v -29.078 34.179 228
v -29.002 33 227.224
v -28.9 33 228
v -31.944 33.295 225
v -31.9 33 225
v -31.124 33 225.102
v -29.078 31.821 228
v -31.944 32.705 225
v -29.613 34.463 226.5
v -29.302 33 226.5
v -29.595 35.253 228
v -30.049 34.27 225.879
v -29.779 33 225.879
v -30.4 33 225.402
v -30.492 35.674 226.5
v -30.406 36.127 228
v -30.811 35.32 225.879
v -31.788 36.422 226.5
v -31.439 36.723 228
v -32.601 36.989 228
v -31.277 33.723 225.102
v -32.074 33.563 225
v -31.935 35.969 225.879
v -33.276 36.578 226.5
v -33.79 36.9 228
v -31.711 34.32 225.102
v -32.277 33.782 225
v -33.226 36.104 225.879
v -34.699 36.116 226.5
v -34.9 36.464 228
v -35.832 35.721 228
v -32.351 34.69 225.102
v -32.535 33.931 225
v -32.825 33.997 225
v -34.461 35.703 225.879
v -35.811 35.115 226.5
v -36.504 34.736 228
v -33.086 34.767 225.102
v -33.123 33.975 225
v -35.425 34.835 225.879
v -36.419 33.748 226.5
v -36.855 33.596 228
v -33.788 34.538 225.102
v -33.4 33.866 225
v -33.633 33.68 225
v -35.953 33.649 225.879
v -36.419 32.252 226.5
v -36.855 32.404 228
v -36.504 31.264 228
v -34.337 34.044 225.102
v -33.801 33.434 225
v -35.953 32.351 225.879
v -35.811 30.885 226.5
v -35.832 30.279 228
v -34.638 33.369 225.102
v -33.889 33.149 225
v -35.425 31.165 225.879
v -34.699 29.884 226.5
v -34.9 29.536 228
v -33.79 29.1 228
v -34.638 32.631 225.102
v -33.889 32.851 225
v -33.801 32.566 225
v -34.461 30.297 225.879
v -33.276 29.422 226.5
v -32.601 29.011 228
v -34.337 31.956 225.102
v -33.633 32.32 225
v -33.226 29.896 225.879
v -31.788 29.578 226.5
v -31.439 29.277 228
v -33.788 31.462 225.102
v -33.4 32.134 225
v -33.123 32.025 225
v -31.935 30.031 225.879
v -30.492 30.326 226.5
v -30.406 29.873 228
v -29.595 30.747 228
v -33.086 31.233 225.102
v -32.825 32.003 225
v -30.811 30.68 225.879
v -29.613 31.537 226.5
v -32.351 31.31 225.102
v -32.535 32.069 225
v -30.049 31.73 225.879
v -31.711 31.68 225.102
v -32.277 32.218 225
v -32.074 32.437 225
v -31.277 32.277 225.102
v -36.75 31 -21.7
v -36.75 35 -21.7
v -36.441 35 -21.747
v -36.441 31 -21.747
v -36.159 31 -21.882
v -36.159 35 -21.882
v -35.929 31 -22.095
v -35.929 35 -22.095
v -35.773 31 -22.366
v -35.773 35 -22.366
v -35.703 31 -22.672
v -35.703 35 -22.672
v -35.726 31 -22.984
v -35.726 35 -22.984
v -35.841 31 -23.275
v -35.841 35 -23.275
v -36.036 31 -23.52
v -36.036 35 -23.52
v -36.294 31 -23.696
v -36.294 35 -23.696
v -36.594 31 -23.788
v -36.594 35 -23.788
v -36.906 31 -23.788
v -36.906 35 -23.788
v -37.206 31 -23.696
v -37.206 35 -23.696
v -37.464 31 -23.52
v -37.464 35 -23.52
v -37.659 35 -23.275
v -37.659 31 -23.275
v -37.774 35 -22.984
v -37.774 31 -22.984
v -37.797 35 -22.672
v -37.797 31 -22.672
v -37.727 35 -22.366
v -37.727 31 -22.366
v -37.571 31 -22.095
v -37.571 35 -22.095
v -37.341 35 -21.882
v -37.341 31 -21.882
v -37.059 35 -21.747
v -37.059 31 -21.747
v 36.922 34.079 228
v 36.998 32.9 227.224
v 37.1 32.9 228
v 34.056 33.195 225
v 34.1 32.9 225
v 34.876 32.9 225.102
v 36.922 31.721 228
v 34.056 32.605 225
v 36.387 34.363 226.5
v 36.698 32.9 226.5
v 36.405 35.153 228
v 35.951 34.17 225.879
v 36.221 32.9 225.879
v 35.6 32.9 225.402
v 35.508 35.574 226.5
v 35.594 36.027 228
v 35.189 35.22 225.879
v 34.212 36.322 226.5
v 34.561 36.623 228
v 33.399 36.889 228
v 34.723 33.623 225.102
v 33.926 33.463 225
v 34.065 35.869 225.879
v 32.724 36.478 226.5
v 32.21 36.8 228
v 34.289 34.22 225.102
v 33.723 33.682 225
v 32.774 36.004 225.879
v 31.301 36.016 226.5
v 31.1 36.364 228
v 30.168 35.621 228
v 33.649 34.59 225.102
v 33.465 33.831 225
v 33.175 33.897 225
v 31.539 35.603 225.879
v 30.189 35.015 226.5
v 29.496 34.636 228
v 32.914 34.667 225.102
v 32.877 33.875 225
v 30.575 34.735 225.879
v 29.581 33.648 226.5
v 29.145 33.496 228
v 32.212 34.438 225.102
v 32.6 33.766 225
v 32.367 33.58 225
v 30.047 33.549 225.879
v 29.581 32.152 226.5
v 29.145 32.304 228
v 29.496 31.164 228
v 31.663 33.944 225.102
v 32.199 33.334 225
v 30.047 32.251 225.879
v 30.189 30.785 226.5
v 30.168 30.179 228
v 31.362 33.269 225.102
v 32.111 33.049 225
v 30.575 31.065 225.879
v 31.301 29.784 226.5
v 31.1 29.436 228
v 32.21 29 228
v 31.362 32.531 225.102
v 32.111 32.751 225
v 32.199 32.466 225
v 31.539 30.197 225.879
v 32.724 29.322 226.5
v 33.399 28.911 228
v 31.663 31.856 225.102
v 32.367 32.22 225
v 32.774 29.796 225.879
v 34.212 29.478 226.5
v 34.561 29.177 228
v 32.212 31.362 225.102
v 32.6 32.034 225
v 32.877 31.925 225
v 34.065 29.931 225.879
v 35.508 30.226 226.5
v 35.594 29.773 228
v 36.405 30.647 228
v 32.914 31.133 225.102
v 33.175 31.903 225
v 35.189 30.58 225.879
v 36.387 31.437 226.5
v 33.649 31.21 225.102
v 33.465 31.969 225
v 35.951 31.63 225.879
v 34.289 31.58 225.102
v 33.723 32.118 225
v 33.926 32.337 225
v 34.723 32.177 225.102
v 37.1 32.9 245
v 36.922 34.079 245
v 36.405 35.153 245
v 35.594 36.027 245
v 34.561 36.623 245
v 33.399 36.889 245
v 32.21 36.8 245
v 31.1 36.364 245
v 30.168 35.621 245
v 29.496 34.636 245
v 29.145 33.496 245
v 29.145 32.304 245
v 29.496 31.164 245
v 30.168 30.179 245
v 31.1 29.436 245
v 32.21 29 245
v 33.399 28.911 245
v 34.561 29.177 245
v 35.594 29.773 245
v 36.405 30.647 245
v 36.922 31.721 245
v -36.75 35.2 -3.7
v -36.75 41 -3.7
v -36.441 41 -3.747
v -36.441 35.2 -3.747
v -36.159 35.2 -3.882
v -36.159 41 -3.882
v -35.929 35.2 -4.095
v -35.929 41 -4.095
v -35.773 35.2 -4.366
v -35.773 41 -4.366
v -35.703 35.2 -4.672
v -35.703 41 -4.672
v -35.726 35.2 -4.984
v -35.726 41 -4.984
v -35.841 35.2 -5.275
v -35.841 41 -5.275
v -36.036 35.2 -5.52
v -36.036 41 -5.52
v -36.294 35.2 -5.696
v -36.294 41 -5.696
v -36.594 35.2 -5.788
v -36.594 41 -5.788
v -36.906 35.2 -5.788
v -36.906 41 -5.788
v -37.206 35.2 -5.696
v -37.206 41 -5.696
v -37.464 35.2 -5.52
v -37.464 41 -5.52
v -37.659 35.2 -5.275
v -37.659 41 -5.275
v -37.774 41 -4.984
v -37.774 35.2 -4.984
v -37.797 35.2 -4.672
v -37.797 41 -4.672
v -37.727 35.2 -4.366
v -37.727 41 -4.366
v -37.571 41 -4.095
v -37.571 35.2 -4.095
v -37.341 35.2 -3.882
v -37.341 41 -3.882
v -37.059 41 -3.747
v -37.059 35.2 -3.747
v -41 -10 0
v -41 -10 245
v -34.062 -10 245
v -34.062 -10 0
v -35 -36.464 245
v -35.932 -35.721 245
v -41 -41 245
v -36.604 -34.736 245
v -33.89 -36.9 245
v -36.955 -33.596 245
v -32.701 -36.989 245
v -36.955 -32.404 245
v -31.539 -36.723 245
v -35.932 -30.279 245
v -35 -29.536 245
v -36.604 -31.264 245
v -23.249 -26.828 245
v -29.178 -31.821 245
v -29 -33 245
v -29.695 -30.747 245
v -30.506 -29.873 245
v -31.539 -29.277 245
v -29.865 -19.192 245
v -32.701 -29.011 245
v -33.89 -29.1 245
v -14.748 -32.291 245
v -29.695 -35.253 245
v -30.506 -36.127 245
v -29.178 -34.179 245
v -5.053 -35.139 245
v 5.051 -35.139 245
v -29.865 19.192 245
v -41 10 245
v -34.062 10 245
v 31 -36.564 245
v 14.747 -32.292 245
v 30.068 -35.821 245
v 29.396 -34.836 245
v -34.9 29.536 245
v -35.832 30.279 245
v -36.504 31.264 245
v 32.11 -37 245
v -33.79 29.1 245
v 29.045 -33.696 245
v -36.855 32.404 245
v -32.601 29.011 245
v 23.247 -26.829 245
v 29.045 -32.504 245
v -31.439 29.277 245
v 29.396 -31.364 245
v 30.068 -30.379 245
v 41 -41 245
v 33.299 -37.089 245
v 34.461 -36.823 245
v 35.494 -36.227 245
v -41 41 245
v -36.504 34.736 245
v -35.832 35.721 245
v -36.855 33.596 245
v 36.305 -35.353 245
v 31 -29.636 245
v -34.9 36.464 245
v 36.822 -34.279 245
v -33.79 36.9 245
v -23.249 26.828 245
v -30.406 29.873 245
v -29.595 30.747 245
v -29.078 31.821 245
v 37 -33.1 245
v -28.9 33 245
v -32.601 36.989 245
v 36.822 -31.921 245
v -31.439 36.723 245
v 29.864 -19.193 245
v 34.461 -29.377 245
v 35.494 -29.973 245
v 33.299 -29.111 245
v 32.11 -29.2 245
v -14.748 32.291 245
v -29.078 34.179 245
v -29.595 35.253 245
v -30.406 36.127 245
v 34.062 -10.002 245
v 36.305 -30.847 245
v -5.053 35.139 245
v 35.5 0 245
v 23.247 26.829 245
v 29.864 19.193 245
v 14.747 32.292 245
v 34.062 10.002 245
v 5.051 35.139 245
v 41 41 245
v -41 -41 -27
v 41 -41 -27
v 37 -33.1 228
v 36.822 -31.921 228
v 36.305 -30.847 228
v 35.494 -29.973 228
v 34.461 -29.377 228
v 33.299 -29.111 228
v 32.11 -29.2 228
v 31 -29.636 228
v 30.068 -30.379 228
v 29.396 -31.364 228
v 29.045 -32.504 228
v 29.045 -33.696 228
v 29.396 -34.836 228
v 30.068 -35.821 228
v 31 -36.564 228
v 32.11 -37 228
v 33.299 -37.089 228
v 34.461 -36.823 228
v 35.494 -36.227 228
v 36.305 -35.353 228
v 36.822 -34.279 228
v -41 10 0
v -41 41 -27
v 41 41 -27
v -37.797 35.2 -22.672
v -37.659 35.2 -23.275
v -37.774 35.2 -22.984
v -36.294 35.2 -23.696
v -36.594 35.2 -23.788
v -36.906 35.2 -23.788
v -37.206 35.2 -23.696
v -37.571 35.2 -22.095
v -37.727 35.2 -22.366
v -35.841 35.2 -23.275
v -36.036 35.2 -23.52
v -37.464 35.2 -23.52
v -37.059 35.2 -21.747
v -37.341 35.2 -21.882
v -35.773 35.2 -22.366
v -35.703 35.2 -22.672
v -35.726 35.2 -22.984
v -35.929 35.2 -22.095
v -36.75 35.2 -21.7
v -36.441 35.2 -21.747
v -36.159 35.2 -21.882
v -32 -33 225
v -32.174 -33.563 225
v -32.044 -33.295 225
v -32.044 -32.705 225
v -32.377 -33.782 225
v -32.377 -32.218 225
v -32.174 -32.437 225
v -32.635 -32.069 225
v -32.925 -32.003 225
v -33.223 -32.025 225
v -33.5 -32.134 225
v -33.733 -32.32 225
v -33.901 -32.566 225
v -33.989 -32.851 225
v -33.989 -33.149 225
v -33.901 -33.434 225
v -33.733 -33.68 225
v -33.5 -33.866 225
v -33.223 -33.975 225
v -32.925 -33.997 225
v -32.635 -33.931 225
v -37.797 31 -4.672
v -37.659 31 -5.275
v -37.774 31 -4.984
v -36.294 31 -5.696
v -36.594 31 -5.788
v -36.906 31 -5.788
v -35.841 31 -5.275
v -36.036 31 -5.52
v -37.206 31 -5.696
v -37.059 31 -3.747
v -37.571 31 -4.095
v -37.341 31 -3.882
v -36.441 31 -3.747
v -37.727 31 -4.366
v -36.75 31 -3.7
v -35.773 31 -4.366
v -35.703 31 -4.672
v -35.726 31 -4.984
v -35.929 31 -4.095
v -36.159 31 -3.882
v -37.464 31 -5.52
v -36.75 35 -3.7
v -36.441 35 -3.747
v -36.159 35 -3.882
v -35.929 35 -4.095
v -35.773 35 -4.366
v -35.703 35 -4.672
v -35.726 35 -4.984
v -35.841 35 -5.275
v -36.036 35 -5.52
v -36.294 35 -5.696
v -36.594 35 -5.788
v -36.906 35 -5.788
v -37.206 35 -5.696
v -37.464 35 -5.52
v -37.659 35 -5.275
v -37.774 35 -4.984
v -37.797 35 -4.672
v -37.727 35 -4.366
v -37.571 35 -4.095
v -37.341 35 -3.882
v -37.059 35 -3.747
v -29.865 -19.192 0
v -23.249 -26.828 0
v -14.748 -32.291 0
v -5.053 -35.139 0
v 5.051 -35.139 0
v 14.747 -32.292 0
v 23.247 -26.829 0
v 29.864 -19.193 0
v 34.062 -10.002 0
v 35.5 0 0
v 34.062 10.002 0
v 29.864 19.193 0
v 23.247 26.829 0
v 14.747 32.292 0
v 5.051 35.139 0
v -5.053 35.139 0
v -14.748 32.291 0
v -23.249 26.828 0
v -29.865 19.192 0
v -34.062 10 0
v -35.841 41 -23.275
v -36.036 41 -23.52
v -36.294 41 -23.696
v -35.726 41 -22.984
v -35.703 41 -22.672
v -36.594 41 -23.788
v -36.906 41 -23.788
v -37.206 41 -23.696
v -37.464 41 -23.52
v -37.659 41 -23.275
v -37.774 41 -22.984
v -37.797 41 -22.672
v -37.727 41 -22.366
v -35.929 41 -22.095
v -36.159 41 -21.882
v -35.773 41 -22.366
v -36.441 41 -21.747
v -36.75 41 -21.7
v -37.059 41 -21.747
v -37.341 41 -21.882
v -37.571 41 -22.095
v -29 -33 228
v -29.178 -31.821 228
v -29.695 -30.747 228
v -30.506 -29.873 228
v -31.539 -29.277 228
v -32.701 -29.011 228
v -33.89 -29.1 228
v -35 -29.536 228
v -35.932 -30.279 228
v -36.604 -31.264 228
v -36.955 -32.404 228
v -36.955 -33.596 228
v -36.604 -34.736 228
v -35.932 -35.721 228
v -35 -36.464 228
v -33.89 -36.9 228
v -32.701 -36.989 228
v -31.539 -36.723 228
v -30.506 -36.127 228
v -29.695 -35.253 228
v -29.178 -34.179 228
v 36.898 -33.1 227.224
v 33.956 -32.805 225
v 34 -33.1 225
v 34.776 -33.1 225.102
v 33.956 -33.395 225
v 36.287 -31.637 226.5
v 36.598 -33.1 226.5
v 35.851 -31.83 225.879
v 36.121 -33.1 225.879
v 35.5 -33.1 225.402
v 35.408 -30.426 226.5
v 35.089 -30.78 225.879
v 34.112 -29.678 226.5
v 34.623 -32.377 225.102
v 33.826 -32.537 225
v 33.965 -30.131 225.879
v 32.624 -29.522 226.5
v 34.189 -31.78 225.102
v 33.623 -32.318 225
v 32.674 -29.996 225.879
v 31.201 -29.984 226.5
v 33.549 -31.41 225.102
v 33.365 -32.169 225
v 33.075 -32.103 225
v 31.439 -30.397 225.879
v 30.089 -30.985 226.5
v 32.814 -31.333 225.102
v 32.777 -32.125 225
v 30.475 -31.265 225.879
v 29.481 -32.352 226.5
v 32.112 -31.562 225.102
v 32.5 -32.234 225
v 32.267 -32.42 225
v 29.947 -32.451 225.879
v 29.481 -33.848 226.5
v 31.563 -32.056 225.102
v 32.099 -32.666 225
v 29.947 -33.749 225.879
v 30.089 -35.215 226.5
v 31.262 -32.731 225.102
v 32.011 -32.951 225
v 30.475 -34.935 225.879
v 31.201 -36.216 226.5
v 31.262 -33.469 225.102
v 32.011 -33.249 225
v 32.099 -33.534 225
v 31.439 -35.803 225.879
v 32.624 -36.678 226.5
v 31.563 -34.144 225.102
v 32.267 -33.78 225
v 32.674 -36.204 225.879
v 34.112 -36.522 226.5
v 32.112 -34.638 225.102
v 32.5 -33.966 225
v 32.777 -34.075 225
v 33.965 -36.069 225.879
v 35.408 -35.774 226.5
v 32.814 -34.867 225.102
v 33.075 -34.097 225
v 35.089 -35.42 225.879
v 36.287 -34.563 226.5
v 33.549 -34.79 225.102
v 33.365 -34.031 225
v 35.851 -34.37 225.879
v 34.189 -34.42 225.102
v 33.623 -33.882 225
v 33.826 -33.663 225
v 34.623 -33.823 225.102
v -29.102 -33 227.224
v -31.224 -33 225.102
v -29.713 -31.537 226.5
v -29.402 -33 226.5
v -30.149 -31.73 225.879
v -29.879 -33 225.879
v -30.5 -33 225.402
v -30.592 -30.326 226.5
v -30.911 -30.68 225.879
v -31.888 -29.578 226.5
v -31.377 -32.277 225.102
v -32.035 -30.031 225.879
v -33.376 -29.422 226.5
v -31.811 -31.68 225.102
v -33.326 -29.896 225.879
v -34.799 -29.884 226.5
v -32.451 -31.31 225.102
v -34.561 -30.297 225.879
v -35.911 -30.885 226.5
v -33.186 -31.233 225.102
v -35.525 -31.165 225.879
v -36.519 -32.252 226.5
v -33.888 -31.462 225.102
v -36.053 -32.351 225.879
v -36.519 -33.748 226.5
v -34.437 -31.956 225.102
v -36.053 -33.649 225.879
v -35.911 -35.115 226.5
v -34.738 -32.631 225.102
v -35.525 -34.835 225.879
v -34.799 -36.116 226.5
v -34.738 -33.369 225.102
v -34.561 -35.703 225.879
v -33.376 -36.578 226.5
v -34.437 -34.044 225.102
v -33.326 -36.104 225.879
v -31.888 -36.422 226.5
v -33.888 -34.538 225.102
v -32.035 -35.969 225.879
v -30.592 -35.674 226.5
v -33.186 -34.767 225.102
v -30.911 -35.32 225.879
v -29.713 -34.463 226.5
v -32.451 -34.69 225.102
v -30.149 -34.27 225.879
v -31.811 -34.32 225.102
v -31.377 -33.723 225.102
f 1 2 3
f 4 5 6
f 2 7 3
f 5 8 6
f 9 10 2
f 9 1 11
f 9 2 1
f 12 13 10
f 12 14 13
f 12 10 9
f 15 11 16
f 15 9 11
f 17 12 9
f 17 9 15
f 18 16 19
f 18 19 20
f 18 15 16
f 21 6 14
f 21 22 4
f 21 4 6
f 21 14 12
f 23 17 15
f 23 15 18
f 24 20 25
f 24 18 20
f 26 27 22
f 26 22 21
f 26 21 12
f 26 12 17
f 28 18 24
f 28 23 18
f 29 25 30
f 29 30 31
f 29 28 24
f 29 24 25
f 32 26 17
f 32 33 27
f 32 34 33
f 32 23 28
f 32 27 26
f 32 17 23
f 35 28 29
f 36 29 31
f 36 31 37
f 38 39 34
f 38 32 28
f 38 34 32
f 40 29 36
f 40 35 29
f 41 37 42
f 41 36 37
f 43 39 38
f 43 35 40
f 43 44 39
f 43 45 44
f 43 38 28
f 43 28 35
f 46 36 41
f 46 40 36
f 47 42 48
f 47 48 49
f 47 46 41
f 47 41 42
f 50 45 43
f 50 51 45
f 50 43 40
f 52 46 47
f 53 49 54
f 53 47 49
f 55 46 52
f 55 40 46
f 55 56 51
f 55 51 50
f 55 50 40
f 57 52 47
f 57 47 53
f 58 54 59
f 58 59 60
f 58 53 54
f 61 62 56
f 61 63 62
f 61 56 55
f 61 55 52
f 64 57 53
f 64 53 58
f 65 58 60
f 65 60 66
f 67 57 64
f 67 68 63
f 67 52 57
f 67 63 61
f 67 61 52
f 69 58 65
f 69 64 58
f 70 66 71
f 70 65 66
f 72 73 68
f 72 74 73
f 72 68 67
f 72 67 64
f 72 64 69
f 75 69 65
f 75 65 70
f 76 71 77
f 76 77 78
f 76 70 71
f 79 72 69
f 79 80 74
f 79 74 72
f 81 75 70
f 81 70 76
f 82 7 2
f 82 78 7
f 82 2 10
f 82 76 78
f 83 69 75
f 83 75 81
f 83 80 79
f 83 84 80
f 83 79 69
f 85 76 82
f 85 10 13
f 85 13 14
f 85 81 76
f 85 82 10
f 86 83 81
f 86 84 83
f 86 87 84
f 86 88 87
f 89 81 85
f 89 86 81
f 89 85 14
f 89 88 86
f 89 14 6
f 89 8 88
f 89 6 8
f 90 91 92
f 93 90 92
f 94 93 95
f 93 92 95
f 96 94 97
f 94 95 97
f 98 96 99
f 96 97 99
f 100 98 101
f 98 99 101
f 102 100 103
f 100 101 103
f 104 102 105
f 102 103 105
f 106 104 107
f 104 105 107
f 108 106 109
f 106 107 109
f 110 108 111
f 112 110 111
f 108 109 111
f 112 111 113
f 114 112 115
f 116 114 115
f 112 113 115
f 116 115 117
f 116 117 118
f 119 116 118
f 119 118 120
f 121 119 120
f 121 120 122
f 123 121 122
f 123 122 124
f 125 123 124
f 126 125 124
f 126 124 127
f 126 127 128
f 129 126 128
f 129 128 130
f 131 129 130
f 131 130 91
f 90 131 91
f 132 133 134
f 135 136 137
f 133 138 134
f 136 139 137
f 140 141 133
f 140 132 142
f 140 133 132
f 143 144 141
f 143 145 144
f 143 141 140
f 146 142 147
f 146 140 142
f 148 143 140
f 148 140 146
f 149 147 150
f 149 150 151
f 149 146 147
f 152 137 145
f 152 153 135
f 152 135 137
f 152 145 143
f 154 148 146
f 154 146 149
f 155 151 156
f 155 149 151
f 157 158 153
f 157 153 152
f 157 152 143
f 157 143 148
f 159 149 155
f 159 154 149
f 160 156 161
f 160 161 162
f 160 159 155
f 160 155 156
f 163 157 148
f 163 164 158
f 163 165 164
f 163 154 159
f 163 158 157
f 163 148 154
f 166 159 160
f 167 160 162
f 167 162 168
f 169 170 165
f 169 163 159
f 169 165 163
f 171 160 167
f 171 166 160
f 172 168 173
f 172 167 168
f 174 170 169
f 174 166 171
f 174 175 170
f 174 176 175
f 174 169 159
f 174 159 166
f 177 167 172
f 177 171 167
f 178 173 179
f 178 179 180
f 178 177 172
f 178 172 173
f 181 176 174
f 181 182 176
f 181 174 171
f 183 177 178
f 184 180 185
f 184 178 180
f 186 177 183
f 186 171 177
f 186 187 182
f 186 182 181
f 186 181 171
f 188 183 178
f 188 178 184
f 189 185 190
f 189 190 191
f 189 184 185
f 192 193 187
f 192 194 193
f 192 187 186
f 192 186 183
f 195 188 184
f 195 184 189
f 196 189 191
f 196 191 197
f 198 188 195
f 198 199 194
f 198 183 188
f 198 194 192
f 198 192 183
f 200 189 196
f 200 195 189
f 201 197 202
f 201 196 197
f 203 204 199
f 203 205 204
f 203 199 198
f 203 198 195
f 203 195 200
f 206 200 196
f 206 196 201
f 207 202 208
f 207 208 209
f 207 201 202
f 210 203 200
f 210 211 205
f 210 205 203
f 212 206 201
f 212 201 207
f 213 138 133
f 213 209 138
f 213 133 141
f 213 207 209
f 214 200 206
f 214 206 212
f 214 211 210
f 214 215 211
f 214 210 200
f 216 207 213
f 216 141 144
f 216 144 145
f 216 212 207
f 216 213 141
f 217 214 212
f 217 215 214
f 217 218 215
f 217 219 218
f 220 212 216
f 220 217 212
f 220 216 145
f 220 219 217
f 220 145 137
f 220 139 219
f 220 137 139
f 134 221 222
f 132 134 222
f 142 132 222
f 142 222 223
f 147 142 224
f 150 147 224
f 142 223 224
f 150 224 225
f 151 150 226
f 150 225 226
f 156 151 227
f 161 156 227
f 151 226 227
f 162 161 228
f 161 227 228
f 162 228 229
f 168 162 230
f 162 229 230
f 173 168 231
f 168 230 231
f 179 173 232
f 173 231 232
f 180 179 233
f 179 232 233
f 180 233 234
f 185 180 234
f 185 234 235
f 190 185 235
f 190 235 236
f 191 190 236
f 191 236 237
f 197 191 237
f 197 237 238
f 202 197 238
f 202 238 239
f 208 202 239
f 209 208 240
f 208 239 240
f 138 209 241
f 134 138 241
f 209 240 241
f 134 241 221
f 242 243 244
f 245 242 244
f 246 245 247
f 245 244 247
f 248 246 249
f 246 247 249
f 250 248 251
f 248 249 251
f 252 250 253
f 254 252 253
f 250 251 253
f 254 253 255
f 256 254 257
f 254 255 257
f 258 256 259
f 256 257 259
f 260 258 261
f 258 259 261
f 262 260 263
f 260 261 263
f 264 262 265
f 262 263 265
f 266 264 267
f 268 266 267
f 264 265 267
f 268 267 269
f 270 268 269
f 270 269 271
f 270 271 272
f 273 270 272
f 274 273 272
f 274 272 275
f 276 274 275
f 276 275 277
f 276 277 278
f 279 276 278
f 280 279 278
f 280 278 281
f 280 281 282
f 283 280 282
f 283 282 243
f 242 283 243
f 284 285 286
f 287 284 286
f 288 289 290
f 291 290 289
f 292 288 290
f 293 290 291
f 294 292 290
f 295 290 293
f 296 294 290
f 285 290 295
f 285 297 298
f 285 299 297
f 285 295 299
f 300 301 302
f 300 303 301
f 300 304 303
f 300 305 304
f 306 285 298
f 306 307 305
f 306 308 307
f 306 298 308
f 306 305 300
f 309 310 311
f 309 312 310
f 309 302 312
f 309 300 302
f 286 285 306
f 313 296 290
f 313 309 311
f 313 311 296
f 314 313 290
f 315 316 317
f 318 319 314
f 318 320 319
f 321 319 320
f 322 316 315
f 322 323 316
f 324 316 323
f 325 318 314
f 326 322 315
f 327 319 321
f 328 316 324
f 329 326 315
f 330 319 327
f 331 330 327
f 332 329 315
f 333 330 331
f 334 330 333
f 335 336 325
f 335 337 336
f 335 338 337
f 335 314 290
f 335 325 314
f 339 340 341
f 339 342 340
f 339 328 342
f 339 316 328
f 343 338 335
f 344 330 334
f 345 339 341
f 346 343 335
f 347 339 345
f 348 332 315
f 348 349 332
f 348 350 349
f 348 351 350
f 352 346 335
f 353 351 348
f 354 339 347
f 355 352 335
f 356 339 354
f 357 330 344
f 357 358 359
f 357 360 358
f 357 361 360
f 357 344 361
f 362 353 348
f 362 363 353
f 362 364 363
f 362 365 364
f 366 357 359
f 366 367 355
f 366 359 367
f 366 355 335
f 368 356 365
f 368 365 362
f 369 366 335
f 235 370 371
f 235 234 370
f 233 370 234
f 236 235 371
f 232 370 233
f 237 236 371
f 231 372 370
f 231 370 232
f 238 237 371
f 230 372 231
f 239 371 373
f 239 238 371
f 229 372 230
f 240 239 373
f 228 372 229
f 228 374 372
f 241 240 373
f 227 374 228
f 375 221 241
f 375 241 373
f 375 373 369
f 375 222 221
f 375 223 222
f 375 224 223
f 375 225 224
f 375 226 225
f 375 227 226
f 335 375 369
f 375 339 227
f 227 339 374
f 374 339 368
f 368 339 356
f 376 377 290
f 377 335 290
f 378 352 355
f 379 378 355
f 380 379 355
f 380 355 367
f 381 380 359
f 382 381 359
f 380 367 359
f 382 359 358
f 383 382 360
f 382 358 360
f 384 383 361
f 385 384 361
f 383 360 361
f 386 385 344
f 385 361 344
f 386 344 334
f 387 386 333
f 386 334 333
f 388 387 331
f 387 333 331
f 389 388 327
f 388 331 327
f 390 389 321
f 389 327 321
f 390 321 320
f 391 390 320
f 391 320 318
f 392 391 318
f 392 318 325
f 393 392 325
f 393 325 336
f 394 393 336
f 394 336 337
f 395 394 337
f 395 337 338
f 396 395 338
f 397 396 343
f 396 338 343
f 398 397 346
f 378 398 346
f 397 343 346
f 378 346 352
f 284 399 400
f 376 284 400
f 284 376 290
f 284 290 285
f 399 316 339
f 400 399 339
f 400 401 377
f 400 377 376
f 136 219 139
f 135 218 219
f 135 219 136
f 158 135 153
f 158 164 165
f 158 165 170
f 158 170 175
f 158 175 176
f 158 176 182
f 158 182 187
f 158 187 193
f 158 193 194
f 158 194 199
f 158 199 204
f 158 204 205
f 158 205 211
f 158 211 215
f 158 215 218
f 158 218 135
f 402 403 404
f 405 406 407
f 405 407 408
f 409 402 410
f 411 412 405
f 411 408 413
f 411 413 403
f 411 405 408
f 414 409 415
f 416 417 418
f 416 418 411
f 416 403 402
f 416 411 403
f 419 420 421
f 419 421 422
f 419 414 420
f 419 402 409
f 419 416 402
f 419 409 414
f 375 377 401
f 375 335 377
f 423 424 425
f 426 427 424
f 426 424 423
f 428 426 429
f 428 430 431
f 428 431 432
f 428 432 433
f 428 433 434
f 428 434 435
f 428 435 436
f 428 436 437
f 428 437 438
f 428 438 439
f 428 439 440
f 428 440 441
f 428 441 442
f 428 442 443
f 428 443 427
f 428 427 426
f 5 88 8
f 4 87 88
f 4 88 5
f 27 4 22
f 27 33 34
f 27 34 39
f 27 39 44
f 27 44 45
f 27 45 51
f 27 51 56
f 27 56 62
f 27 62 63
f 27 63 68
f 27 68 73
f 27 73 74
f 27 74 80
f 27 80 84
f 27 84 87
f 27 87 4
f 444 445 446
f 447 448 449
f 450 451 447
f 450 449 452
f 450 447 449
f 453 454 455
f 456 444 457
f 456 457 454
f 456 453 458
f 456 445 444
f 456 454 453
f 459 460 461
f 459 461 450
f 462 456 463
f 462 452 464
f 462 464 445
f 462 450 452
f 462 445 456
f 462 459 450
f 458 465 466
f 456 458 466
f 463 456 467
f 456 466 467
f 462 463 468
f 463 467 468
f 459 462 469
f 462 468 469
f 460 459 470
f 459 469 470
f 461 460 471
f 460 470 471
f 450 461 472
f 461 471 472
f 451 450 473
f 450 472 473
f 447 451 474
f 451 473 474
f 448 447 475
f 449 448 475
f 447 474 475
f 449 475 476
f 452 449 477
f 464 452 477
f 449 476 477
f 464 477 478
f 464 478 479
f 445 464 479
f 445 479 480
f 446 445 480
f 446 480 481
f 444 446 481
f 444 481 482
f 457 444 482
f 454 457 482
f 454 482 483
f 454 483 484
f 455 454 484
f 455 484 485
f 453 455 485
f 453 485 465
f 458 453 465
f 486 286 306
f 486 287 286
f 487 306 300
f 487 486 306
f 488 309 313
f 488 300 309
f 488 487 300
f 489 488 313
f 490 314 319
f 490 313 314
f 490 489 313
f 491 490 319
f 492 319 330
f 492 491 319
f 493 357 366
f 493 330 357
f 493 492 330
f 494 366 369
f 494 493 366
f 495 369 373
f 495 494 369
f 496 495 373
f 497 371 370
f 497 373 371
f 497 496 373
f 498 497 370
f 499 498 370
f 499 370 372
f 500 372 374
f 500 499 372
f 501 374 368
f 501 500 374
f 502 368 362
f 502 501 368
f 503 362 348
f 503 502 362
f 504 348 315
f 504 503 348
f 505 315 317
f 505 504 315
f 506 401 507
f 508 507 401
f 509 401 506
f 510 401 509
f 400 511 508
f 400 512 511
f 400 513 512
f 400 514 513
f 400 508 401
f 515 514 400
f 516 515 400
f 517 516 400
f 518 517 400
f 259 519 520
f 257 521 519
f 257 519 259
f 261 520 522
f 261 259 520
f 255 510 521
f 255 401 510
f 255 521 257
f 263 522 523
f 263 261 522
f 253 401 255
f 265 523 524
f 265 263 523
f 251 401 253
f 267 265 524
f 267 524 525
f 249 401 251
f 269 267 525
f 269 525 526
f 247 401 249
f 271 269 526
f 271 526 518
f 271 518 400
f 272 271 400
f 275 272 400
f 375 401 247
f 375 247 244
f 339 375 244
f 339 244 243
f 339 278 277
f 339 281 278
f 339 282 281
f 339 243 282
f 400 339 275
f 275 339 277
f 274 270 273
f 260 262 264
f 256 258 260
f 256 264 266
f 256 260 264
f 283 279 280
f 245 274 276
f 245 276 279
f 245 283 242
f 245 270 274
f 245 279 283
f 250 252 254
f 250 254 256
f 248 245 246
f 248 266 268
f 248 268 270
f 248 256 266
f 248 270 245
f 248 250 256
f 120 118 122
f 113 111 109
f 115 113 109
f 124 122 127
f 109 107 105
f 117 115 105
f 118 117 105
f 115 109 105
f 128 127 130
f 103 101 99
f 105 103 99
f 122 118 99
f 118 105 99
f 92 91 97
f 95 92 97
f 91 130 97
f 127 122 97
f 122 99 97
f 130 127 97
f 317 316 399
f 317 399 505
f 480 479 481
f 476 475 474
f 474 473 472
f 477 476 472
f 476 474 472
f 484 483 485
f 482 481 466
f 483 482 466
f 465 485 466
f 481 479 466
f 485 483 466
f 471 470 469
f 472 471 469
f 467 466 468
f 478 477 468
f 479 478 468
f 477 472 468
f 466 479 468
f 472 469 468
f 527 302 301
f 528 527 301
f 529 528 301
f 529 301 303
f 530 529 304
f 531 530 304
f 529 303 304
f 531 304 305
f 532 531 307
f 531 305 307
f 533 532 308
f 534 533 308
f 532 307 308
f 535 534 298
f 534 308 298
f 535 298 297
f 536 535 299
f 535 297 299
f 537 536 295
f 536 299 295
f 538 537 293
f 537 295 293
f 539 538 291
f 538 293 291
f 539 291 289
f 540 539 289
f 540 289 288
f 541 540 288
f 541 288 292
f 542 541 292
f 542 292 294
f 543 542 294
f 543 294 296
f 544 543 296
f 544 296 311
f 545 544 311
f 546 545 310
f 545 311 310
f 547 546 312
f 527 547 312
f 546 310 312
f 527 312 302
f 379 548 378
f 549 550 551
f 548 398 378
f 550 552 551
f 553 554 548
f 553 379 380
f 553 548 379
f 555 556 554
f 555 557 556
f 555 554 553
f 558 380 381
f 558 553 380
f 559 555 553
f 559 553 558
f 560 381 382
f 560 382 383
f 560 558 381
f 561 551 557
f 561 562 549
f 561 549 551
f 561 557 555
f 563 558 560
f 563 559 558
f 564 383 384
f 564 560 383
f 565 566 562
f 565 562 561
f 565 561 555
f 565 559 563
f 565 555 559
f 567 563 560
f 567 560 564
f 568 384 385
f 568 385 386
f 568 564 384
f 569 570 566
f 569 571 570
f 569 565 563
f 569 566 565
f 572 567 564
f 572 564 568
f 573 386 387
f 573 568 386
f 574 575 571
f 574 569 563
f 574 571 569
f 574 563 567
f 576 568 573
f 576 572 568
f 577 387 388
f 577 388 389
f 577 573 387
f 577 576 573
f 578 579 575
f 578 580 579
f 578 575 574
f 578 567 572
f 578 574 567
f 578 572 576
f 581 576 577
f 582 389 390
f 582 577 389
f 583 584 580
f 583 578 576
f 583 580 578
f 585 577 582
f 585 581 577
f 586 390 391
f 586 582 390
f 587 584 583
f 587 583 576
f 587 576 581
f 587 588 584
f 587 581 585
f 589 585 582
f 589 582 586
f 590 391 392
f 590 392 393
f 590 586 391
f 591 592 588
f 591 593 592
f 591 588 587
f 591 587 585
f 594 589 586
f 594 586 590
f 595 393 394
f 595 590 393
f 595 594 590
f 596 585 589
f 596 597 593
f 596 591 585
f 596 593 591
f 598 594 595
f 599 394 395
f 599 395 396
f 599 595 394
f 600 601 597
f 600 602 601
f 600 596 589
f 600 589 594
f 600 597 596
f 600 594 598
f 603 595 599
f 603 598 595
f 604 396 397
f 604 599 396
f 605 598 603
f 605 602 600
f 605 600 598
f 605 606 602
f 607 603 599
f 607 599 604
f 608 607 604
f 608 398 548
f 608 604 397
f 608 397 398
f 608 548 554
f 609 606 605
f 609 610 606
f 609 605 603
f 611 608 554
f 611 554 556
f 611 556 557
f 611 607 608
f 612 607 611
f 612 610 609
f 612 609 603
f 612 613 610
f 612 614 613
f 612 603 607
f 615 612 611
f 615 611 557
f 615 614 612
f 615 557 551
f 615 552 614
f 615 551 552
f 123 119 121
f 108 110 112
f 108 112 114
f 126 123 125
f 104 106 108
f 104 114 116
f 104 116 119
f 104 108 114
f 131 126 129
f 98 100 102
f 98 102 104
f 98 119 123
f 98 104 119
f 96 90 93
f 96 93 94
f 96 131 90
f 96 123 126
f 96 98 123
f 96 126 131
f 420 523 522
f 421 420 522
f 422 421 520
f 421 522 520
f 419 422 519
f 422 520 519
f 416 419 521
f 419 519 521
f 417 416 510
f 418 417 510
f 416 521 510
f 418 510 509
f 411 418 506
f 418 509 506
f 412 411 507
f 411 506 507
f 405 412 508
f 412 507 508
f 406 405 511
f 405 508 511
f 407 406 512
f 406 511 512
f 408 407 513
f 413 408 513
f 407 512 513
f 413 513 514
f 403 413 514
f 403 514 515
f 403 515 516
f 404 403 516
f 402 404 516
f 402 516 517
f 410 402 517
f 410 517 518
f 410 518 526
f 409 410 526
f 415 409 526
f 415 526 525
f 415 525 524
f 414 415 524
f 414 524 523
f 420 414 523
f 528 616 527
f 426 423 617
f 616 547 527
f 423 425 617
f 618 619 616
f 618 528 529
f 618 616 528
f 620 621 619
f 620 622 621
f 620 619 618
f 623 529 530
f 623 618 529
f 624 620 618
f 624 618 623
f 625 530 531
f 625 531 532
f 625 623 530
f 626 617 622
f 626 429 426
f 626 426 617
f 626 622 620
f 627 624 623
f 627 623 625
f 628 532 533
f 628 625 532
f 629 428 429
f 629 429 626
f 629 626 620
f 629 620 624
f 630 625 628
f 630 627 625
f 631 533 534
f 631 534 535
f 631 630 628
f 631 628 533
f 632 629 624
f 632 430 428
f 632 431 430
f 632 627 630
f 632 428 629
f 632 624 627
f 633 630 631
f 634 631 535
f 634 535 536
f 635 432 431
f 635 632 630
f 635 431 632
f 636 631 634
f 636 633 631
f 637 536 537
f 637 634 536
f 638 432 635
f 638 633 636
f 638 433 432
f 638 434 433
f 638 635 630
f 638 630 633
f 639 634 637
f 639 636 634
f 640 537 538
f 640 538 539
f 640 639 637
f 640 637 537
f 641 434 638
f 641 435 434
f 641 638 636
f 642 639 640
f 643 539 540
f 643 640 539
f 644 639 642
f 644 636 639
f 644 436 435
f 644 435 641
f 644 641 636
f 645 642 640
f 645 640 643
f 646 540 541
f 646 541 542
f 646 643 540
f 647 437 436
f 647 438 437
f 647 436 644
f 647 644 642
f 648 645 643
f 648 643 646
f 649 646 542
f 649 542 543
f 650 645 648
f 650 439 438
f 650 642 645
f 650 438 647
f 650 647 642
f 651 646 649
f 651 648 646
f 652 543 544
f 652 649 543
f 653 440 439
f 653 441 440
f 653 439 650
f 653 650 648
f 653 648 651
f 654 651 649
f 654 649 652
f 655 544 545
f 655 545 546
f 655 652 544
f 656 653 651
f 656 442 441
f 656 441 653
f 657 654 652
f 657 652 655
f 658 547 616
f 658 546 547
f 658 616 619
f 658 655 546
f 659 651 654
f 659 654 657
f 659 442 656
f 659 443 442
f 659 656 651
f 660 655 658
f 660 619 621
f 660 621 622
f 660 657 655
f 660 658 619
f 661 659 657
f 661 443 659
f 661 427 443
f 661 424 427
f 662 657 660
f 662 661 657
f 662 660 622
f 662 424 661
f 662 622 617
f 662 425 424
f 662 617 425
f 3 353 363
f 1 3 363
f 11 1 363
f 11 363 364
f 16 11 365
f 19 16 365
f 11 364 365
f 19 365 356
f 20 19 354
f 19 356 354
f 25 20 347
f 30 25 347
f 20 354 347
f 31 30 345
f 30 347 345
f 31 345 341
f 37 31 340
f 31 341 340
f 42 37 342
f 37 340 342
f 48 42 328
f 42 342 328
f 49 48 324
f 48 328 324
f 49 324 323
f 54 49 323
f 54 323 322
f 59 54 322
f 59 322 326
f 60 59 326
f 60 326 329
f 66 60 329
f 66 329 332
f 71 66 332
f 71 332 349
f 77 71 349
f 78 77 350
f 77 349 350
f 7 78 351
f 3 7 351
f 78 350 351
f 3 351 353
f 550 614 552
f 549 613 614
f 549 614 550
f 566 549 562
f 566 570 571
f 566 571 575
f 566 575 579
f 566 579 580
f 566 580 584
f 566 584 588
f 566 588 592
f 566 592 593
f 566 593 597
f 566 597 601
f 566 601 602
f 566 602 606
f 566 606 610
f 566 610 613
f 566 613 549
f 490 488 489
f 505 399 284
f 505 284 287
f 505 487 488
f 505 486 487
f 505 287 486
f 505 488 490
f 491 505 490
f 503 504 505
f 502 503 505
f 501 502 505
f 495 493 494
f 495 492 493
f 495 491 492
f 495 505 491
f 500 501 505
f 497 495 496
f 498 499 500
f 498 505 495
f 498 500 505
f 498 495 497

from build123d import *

# Parameters (mm, degrees)
SKETCH_1_W          = 82
SKETCH_1_H          = 82
SKETCH_1_R          = 35.5
EXTRUDE_1_DEPTH     = 245
SKETCH_2_W          = 82
SKETCH_2_H          = 82
EXTRUDE_2_DEPTH     = 27
SKETCH_3_W          = 8
SKETCH_3_H          = 20
CUT_EXTRUDE_1_DEPTH = 245
SKETCH_4_R          = 4
CUT_EXTRUDE_2_DEPTH = 20
FILLET_2_R          = 3
FILLET_3_R          = 3
FILLET_4_R          = 3
FILLET_5_R          = 3
SKETCH_5_R          = 1.05
CUT_EXTRUDE_3_DEPTH = 10
EXTRUDE_START       = 0.2
SKETCH_6_R          = 1.05
EXTRUDE_3_DEPTH     = 0.2


with BuildPart() as part:
    # 草圖1 → 填料-伸長1 (new body)
    with BuildSketch(Plane.XY):
        Rectangle(SKETCH_1_W, SKETCH_1_H)
        Circle(SKETCH_1_R, mode=Mode.SUBTRACT)
    extrude(amount=EXTRUDE_1_DEPTH)

    # 草圖2 → 填料-伸長2 (add)
    with BuildSketch(Plane(origin=(0, 0, 0), x_dir=(-1, 0, 0), z_dir=(0, 0, -1))):
        Rectangle(SKETCH_2_W, SKETCH_2_H)
    extrude(amount=EXTRUDE_2_DEPTH)

    # 草圖3 → 除料-伸長1 (cut)
    with BuildSketch(Plane.XY.offset(245)):
        with Locations((-37, 0)):
            Rectangle(SKETCH_3_W, SKETCH_3_H)
    extrude(amount=-CUT_EXTRUDE_1_DEPTH, mode=Mode.SUBTRACT)

    # 草圖4 → 除料-伸長2 (cut)
    with BuildSketch(Plane.XY.offset(245)):
        with Locations((-32.9, 33)):
            Circle(SKETCH_4_R)
        with Locations((33.1, 32.9)):
            Circle(SKETCH_4_R)
        with Locations((33, -33.1)):
            Circle(SKETCH_4_R)
        with Locations((-33, -33)):
            Circle(SKETCH_4_R)
    extrude(amount=-CUT_EXTRUDE_2_DEPTH, mode=Mode.SUBTRACT)

    # 圓角2
    fillet_2_edges = [part.edges().sort_by_distance(p)[0] for p in [
        (-36.9, 33, 225),
    ]]
    fillet(fillet_2_edges, radius=FILLET_2_R)

    # 圓角3
    fillet_3_edges = [part.edges().sort_by_distance(p)[0] for p in [
        (29.1, 32.9, 225),
    ]]
    fillet(fillet_3_edges, radius=FILLET_3_R)

    # 圓角4
    fillet_4_edges = [part.edges().sort_by_distance(p)[0] for p in [
        (-37, -33, 225),
    ]]
    fillet(fillet_4_edges, radius=FILLET_4_R)

    # 圓角5
    fillet_5_edges = [part.edges().sort_by_distance(p)[0] for p in [
        (29, -33.1, 225),
    ]]
    fillet(fillet_5_edges, radius=FILLET_5_R)

    # 草圖5 → 除料-伸長3 (cut)
    with BuildSketch(Plane(origin=(0, 41, 0), x_dir=(1, 0, 0), z_dir=(0, 1, 0))):
        with Locations(Location((-36.75, 22.75, 0), (0, 0, 270))):
            Circle(SKETCH_5_R)
        with Locations(Location((-36.75, 4.75, 0), (0, 0, 270))):
            Circle(SKETCH_5_R)
    extrude(amount=-CUT_EXTRUDE_3_DEPTH, mode=Mode.SUBTRACT)

    # 草圖6 → 填料-伸長3 (add)
    with BuildSketch(Plane(origin=(0, 35, 0), x_dir=(1, 0, 0), z_dir=(0, 1, 0)).offset(EXTRUDE_START)):
        with Locations(Location((-36.75, 22.75, 0), (0, 0, 270))):
            Circle(SKETCH_6_R)
        with Locations(Location((-36.75, 4.75, 0), (0, 0, 270))):
            Circle(SKETCH_6_R)
    extrude(amount=-EXTRUDE_3_DEPTH)


solid = part.part
